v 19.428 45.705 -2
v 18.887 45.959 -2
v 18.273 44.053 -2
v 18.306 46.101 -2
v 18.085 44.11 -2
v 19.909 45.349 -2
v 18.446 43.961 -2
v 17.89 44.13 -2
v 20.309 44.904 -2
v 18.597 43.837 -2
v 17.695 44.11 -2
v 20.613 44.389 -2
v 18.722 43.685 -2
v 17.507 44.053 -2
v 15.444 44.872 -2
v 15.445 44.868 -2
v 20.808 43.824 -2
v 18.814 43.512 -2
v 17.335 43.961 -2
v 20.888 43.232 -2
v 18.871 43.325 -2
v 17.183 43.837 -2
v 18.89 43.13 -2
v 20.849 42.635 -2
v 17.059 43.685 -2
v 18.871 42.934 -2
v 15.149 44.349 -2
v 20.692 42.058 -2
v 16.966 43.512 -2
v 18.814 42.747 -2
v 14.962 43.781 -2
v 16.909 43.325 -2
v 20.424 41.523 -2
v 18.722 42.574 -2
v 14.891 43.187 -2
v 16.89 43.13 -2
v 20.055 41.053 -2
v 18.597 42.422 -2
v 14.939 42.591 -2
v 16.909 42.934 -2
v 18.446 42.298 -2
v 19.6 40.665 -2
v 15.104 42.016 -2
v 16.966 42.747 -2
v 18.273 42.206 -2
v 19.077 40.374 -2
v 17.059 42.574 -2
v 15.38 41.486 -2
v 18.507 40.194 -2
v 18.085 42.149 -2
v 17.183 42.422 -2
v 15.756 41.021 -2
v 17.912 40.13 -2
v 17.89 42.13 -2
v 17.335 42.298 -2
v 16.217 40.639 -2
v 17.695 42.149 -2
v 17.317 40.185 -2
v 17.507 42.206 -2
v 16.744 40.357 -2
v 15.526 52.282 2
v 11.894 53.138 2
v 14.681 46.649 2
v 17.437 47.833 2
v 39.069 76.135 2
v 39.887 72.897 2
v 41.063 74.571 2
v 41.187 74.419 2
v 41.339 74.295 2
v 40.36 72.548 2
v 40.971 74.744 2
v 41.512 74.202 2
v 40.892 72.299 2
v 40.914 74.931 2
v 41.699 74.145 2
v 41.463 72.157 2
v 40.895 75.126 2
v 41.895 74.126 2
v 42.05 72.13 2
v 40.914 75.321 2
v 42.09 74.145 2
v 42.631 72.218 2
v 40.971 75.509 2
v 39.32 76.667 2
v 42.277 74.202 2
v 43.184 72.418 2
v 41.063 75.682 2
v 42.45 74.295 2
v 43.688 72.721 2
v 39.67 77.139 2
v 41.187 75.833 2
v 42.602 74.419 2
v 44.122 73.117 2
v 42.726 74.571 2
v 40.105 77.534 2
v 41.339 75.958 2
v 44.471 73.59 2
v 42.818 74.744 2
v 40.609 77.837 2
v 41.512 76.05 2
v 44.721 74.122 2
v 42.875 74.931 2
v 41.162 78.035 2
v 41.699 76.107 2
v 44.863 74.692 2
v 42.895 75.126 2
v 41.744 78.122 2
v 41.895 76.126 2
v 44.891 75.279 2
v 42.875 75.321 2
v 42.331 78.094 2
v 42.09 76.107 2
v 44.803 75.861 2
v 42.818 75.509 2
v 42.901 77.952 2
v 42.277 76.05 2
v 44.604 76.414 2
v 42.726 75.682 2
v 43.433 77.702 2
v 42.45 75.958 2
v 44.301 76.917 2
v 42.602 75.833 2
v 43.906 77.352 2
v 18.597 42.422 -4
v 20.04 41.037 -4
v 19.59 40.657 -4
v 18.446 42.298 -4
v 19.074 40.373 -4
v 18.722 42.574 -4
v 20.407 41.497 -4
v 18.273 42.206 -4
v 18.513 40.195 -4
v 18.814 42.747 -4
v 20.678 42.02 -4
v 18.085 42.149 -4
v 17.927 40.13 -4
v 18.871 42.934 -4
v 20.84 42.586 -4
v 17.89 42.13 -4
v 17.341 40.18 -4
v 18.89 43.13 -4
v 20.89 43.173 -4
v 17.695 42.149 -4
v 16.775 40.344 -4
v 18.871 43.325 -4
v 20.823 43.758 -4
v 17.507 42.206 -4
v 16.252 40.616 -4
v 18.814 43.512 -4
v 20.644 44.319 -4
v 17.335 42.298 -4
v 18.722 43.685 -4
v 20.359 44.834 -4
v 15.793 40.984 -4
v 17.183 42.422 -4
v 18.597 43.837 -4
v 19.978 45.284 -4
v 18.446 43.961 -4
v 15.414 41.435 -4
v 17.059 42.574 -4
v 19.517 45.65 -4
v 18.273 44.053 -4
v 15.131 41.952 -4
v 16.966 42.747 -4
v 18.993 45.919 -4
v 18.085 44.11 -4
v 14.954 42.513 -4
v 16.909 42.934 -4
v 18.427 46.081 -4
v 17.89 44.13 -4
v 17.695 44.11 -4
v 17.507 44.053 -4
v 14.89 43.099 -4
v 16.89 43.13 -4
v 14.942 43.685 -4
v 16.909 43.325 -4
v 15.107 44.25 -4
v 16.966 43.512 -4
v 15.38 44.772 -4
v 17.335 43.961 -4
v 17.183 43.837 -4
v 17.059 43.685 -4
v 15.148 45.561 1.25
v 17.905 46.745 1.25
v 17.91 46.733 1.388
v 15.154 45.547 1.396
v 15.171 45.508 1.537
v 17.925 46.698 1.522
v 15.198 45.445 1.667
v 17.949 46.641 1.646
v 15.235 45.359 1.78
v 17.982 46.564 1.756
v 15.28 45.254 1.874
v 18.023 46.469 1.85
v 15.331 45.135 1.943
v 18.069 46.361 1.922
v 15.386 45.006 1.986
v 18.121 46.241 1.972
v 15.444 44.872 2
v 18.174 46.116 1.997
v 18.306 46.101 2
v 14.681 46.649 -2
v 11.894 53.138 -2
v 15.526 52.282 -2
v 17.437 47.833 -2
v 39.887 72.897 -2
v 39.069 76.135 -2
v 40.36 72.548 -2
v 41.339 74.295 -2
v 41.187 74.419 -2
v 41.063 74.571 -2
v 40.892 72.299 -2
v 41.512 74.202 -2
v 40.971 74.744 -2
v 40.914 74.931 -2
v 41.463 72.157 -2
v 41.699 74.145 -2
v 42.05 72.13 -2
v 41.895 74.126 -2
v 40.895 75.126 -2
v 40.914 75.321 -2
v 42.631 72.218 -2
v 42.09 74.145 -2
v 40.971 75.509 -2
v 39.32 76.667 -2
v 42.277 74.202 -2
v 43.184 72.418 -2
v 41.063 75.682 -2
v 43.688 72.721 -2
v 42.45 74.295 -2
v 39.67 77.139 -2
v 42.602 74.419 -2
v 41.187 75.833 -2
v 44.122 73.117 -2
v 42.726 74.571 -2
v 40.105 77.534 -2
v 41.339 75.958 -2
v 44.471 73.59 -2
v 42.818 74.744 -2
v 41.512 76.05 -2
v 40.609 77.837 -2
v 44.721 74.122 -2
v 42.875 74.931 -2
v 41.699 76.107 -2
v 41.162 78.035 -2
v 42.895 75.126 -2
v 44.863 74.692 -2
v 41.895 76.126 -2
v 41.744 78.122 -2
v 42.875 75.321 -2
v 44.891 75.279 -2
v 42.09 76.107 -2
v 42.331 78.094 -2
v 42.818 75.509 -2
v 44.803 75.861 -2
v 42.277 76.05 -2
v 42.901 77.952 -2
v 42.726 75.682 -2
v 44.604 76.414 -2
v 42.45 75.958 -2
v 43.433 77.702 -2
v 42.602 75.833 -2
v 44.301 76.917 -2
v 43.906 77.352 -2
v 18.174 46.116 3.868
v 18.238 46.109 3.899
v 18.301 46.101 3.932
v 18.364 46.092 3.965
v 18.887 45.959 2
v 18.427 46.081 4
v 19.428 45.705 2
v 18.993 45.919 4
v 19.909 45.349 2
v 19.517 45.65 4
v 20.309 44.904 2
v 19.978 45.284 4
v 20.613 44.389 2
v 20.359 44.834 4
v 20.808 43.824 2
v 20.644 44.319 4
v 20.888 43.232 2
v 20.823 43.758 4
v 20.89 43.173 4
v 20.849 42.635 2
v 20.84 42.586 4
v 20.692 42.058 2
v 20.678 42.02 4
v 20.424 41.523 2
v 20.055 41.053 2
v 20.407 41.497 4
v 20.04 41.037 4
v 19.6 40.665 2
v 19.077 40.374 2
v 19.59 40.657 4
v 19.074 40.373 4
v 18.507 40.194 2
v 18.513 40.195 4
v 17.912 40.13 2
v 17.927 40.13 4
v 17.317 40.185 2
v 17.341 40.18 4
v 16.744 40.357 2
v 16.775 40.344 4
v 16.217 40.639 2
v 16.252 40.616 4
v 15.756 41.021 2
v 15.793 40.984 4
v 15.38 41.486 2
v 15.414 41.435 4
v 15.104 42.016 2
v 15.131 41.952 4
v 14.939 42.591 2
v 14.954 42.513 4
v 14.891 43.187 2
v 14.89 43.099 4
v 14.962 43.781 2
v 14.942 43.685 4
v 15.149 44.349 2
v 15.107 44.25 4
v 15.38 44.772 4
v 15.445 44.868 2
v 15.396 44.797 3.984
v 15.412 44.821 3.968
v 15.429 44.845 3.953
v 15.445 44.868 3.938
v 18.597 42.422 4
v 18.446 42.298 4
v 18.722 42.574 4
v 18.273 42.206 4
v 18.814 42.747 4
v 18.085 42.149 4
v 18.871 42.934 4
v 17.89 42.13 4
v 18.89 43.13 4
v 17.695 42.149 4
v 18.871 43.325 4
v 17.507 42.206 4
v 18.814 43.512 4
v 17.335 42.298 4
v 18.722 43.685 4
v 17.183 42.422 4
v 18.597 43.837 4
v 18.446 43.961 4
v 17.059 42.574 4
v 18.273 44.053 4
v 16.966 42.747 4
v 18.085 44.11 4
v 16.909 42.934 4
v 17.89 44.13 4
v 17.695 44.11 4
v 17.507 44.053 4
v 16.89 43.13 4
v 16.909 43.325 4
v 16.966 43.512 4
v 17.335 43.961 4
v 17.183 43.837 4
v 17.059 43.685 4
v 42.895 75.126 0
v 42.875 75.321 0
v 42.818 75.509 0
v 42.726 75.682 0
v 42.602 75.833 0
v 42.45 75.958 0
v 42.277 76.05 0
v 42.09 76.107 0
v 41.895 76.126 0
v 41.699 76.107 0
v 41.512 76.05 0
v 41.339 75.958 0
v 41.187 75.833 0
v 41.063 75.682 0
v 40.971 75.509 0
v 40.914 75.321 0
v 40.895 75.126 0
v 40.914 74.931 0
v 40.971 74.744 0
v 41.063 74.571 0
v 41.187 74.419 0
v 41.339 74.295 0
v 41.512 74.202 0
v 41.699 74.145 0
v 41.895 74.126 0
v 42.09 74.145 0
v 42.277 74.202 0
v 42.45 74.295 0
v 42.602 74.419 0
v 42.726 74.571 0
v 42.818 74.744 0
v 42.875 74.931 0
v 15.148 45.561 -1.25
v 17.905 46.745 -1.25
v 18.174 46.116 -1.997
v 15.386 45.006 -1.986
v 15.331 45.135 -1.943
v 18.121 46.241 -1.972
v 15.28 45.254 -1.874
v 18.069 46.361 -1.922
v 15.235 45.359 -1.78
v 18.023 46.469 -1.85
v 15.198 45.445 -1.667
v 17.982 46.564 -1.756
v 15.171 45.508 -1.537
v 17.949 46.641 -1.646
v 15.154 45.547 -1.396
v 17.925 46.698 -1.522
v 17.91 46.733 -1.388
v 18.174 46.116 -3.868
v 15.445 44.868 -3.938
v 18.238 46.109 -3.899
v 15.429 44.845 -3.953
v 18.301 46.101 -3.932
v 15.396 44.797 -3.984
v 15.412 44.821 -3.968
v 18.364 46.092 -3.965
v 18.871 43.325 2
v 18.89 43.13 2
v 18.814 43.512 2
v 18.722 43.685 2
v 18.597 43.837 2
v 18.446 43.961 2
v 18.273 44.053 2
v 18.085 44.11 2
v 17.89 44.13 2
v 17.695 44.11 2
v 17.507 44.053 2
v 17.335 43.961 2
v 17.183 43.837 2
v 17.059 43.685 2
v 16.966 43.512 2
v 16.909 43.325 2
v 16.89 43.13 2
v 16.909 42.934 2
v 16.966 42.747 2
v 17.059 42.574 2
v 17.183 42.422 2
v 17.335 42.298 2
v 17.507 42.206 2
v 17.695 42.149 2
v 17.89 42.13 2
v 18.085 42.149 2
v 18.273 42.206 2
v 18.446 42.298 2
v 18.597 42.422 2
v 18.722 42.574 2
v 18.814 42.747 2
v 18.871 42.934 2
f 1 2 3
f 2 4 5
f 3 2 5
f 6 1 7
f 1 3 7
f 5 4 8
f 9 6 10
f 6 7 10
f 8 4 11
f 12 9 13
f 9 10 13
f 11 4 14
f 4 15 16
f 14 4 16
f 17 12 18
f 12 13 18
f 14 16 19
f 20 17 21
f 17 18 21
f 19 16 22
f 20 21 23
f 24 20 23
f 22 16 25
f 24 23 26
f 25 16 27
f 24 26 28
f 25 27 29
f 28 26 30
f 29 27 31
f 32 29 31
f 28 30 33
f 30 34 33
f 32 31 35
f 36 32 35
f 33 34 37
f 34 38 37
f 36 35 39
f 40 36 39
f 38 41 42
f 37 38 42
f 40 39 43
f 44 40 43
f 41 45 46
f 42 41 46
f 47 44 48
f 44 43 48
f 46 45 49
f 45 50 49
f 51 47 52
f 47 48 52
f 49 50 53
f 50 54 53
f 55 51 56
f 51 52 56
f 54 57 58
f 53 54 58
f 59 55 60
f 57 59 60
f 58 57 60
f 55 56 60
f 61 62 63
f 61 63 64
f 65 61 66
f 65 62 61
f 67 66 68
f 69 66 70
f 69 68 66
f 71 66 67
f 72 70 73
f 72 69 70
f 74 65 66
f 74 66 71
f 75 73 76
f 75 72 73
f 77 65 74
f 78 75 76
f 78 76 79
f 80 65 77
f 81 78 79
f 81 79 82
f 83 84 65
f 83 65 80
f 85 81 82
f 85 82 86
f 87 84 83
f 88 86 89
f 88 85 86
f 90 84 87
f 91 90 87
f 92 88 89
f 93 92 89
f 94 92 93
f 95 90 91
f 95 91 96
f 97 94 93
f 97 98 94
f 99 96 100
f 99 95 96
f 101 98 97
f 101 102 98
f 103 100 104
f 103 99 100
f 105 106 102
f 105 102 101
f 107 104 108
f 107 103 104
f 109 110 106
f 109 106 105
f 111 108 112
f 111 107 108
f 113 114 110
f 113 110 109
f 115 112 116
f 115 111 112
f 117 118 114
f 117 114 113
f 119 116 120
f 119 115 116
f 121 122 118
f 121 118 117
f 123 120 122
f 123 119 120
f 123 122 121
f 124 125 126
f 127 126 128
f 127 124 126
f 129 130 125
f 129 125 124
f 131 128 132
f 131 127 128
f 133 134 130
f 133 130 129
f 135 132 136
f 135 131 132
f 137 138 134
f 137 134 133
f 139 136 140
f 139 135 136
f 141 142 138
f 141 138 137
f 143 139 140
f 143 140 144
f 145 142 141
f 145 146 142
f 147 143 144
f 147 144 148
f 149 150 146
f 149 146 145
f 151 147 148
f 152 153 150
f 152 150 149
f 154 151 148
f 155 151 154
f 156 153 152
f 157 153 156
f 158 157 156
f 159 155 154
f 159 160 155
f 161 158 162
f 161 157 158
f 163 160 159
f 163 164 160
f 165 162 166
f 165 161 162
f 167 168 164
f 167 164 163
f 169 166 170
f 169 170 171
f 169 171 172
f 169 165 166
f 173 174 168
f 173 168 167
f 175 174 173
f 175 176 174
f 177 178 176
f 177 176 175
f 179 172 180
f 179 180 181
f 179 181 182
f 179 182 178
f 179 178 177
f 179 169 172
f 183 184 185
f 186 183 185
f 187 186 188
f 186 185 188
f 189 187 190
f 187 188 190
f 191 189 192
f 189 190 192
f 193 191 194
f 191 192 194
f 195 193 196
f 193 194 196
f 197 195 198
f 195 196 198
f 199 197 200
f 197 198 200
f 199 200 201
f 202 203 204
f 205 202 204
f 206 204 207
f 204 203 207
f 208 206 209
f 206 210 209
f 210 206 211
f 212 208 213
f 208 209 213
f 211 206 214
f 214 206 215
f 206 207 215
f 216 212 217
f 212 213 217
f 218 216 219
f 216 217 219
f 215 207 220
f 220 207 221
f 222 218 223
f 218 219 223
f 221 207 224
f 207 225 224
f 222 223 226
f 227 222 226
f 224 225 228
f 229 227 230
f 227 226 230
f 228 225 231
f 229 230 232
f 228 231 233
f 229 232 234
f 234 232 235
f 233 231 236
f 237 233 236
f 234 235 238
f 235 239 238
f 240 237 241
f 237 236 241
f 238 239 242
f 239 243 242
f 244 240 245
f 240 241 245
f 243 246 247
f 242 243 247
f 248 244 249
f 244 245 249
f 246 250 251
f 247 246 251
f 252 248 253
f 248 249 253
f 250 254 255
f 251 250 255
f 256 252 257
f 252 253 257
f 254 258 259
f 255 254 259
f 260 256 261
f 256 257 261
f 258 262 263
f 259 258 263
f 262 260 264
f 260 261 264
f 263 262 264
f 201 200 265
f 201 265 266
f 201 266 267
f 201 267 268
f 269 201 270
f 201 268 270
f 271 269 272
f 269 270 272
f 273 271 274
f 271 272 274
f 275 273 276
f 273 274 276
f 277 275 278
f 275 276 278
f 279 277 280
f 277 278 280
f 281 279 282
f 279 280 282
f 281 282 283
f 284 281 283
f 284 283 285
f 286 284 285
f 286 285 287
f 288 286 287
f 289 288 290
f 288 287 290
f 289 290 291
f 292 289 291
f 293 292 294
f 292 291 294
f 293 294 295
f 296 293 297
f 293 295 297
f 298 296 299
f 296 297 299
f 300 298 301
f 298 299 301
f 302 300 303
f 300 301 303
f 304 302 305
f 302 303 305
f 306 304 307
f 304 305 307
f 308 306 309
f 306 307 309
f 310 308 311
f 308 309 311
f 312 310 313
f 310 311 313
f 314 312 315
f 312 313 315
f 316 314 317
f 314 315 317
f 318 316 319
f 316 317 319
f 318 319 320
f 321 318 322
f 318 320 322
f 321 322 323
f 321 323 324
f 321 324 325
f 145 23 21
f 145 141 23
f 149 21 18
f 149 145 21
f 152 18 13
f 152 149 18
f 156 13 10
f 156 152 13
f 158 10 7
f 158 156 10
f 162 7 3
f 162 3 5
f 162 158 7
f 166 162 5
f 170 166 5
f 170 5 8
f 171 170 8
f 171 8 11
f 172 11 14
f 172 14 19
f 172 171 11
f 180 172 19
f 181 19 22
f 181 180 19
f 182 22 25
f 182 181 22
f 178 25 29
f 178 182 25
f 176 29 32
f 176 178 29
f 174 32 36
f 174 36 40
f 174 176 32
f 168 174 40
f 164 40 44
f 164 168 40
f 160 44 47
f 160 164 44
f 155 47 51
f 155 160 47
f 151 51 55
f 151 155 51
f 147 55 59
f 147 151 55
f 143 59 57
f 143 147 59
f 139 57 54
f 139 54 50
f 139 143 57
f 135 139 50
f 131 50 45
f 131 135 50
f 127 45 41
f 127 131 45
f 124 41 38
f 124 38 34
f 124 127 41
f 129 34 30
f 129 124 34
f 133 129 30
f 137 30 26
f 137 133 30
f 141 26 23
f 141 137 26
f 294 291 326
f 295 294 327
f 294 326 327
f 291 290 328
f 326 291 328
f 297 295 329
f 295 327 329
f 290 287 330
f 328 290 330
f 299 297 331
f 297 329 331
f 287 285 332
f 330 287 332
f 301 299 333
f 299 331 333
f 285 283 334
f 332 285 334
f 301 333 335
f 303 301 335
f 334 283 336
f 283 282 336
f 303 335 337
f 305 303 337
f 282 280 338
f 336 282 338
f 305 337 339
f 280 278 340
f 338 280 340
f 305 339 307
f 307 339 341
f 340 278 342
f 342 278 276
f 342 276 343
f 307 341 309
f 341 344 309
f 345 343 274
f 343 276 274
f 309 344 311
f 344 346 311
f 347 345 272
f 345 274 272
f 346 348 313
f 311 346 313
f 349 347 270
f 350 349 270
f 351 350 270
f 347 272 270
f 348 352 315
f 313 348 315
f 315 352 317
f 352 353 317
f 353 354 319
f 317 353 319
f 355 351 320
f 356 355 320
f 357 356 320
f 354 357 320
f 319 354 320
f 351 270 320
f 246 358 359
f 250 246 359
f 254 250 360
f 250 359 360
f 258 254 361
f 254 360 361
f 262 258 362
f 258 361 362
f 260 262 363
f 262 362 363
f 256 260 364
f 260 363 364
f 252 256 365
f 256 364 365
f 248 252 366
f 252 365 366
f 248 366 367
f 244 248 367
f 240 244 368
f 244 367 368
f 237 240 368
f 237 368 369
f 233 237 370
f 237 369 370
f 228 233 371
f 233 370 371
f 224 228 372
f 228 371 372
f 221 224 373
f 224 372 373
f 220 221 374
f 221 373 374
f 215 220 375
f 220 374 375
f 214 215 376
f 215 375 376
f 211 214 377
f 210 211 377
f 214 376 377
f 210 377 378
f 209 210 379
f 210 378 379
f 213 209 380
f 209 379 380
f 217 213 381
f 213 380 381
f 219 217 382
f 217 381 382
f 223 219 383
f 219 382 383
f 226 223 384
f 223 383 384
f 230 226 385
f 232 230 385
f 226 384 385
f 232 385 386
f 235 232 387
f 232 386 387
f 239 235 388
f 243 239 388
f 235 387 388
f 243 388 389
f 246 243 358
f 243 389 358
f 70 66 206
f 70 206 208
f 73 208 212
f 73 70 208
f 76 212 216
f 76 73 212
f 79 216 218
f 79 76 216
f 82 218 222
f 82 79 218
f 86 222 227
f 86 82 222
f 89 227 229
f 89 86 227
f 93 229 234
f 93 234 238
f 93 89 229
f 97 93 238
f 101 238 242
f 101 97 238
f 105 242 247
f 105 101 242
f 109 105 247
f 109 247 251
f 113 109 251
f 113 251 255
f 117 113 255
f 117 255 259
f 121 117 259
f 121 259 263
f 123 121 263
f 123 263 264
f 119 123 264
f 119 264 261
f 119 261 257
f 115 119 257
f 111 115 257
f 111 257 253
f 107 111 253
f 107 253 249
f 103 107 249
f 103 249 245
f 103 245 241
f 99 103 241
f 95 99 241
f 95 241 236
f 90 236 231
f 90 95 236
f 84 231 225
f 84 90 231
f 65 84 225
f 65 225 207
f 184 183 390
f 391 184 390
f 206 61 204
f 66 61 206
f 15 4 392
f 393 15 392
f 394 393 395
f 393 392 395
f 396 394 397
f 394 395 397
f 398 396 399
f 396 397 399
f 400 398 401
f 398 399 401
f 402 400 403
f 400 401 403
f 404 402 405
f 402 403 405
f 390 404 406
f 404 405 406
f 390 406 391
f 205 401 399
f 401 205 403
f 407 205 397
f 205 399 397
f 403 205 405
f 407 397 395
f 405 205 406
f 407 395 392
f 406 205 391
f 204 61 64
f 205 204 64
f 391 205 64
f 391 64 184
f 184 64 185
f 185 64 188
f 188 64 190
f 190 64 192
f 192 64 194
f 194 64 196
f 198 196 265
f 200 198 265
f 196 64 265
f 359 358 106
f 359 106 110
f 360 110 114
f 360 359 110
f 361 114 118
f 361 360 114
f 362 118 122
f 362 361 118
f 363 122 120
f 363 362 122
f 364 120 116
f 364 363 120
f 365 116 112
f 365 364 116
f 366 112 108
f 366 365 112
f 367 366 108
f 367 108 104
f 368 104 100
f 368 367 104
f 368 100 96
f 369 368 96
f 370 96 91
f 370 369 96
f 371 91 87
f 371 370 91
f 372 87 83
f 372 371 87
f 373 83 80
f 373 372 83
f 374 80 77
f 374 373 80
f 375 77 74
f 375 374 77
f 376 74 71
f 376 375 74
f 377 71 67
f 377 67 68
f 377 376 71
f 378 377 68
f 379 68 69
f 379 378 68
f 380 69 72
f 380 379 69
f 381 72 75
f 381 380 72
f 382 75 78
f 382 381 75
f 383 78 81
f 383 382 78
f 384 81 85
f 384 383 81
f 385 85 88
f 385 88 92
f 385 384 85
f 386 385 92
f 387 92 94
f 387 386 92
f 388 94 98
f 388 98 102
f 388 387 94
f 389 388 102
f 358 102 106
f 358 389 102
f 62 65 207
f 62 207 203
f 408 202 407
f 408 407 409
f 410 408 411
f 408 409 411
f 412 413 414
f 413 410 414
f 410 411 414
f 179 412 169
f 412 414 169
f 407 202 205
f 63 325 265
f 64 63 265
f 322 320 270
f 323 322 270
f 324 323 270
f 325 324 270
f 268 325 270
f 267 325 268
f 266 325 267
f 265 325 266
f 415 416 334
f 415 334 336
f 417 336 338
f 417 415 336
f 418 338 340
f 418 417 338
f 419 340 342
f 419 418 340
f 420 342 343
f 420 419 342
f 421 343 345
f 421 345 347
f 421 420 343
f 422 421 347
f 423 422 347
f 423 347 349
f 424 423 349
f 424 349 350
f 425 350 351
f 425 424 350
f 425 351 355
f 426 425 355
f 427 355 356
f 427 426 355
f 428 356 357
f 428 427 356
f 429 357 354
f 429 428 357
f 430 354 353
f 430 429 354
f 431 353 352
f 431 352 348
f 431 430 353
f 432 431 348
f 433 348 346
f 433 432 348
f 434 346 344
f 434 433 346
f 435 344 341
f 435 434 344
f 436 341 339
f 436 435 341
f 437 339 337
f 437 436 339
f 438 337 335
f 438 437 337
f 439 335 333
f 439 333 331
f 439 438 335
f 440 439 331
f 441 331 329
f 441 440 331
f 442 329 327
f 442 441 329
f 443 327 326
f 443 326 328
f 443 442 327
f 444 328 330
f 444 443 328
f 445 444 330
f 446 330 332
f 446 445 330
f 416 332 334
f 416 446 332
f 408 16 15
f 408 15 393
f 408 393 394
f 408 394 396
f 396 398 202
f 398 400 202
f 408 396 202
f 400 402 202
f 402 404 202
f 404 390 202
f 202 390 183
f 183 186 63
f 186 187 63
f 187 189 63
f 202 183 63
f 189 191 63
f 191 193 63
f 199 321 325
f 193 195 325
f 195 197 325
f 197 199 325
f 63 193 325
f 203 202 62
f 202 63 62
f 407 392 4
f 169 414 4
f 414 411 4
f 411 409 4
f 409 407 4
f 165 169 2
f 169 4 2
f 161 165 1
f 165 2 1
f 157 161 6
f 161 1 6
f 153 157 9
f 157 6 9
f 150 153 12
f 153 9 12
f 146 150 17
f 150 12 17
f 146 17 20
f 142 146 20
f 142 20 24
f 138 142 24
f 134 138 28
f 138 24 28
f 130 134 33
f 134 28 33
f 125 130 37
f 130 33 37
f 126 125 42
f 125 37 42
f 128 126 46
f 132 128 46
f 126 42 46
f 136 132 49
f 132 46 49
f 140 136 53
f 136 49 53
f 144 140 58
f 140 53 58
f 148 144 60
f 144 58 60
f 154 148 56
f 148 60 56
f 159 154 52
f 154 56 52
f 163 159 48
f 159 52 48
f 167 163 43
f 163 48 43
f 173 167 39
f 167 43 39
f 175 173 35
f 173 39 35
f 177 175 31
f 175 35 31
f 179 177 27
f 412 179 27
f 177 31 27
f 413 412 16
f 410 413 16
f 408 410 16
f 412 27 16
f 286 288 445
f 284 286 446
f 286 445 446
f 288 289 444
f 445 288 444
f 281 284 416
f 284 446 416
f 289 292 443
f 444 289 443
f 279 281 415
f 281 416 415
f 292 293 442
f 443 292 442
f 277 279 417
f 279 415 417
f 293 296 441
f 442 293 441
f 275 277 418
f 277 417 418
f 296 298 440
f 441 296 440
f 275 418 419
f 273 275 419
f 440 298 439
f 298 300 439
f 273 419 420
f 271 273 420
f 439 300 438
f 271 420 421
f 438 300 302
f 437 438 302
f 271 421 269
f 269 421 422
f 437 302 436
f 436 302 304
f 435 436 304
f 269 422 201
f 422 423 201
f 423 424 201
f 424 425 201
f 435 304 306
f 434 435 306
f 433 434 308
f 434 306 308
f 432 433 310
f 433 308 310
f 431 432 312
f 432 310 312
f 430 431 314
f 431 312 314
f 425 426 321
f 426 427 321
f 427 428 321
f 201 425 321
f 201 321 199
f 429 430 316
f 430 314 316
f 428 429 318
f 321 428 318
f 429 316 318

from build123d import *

# Parameters (mm, degrees)
SKETCH7_R               = 2.9999999999999982
SKETCH7_R_2             = 1.0000000000000018
SKETCH7_R_3             = 3.0000000000000018
SKETCH7_R_4             = 0.9999999999999983
BOSS_EXTRUDE1_DEPTH     = 2
SKETCH9_R               = 0.9999999999999983
BOSS_EXTRUDE2_DEPTH     = 4
CUT_EXTRUDE3_DEPTH      = 68.5610601855979
CUT_EXTRUDE3_DEPTH_BACK = 68.5610601855979
CHAMFER1_SIZE           = 2
FILLET10_R              = 0.75


with BuildPart() as part:
    # Sketch7 → Boss-Extrude1 (new, symmetric)
    # profile 1 of 3: a face of its own
    with BuildSketch(Plane.XY):
        with BuildLine():
            Line((11.893863235859584, 53.137939029439345), (15.445357626885196, 44.86830254465274))
            ThreePointArc((15.445357626885198, 44.86830254465274), (16.642699652600193, 45.857903547949306), (18.174468795559314, 46.11601469638566))
            Line((18.174468795559314, 46.11601469638567), (15.526434240422798, 52.28194958437761))
            Line((15.526434240422798, 52.28194958437761), (39.886948210676515, 72.89692053805315))
            ThreePointArc((39.88694821067651, 72.89692053805315), (38.98584570958542, 74.39162614577609), (39.06921198001558, 76.13495073866909))
            Line((39.06921198001558, 76.13495073866909), (11.893863235859584, 53.137939029439345))
        make_face()
    # profile 2 of 3: a face of its own
    with BuildSketch(Plane.XY):
        with Locations((17.890076901850104, 43.12952490889392)):
            Circle(SKETCH7_R)
        with Locations((17.890076901850104, 43.12952490889392)):
            Circle(SKETCH7_R_2, mode=Mode.SUBTRACT)
    # profile 3 of 3: a face of its own
    with BuildSketch(Plane.XY):
        with Locations((41.8945256681437, 75.12618785093188)):
            Circle(SKETCH7_R_3)
        with Locations((41.8945256681437, 75.12618785093188)):
            Circle(SKETCH7_R_4, mode=Mode.SUBTRACT)
    extrude(amount=BOSS_EXTRUDE1_DEPTH, both=True)

    # Sketch9 → Boss-Extrude2 (add, symmetric)
    with BuildSketch(Plane.XY):
        with BuildLine():
            Line((17.43729995500307, 47.832508562943936), (18.174468795559275, 46.11601469638567))
            ThreePointArc((18.174468795559275, 46.11601469638567), (19.137454151100034, 40.40114626983855), (15.4453576268852, 44.86830254465274))
            Line((15.4453576268852, 44.86830254465274), (14.680754460074215, 46.64867709926875))
            Line((14.680754460074215, 46.64867709926875), (17.43729995500307, 47.832508562943936))
        make_face()
        with Locations((17.890076901850104, 43.12952490889392)):
            Circle(SKETCH9_R, mode=Mode.SUBTRACT)
    extrude(amount=BOSS_EXTRUDE2_DEPTH, both=True)

    # Sketch10 → Cut-Extrude3 (cut, two sides: drawn at the far end of the back side and taken through both)
    with BuildSketch(Plane(origin=(32.06546623724915, 13.770898357710635, 0), x_dir=(0, 0, -1), z_dir=(0.9188484983096216, 0.39461048789173536, 0)).offset(-CUT_EXTRUDE3_DEPTH_BACK)):
        Polygon((1.9999999999999996, 27.385841036947262), (-1.9999999999999991, 27.385841036947262), (-1.9999999999999996, 35.88584103694727), (2.0000000000000004, 35.88584103694727), align=None)
    extrude(amount=CUT_EXTRUDE3_DEPTH + CUT_EXTRUDE3_DEPTH_BACK, mode=Mode.SUBTRACT)

    # Chamfer1
    chamfer1_edges = [part.edges().sort_by_distance(p)[0] for p in [
        (16.05902720753864, 47.24059283110634, -4),
        (16.05902720753864, 47.24059283110634, 4),
    ]]
    chamfer(chamfer1_edges, length=CHAMFER1_SIZE - 0.0001)  # a hair under: the kernel refuses the full size

    # Fillet10
    fillet10_edges = [part.edges().sort_by_distance(p)[0] for p in [
        (16.526264249789705, 46.15263377324982, -2.0000000000000004),
        (16.526264249789676, 46.15263377324982, 1.9999999999999996),
    ]]
    fillet(fillet10_edges, radius=FILLET10_R)


solid = part.part
